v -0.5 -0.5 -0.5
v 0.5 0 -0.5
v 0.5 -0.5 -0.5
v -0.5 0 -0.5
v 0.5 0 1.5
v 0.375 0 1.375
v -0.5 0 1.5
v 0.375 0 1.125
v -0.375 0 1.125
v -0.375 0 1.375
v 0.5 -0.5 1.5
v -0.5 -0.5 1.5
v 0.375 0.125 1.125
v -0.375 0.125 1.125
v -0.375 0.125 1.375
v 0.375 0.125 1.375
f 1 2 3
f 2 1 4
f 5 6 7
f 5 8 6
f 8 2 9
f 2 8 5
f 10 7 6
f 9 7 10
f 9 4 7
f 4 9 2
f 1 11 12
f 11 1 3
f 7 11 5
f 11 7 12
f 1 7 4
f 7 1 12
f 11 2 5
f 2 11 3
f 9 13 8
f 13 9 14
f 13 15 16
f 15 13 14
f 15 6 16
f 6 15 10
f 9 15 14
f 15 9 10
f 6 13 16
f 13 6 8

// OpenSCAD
rotate(-90, [1, 0, 0])
rotate(90, [0, 0, 1])
translate([-1, 0, 0]) {
    translate([8/16, 0, -4/16])
    cube([32/16, 16/16, 8/16], center = true);
    translate([-4/16, 0, -3/16])
    cube([4/16, 12/16, 10/16], center = true);
}
